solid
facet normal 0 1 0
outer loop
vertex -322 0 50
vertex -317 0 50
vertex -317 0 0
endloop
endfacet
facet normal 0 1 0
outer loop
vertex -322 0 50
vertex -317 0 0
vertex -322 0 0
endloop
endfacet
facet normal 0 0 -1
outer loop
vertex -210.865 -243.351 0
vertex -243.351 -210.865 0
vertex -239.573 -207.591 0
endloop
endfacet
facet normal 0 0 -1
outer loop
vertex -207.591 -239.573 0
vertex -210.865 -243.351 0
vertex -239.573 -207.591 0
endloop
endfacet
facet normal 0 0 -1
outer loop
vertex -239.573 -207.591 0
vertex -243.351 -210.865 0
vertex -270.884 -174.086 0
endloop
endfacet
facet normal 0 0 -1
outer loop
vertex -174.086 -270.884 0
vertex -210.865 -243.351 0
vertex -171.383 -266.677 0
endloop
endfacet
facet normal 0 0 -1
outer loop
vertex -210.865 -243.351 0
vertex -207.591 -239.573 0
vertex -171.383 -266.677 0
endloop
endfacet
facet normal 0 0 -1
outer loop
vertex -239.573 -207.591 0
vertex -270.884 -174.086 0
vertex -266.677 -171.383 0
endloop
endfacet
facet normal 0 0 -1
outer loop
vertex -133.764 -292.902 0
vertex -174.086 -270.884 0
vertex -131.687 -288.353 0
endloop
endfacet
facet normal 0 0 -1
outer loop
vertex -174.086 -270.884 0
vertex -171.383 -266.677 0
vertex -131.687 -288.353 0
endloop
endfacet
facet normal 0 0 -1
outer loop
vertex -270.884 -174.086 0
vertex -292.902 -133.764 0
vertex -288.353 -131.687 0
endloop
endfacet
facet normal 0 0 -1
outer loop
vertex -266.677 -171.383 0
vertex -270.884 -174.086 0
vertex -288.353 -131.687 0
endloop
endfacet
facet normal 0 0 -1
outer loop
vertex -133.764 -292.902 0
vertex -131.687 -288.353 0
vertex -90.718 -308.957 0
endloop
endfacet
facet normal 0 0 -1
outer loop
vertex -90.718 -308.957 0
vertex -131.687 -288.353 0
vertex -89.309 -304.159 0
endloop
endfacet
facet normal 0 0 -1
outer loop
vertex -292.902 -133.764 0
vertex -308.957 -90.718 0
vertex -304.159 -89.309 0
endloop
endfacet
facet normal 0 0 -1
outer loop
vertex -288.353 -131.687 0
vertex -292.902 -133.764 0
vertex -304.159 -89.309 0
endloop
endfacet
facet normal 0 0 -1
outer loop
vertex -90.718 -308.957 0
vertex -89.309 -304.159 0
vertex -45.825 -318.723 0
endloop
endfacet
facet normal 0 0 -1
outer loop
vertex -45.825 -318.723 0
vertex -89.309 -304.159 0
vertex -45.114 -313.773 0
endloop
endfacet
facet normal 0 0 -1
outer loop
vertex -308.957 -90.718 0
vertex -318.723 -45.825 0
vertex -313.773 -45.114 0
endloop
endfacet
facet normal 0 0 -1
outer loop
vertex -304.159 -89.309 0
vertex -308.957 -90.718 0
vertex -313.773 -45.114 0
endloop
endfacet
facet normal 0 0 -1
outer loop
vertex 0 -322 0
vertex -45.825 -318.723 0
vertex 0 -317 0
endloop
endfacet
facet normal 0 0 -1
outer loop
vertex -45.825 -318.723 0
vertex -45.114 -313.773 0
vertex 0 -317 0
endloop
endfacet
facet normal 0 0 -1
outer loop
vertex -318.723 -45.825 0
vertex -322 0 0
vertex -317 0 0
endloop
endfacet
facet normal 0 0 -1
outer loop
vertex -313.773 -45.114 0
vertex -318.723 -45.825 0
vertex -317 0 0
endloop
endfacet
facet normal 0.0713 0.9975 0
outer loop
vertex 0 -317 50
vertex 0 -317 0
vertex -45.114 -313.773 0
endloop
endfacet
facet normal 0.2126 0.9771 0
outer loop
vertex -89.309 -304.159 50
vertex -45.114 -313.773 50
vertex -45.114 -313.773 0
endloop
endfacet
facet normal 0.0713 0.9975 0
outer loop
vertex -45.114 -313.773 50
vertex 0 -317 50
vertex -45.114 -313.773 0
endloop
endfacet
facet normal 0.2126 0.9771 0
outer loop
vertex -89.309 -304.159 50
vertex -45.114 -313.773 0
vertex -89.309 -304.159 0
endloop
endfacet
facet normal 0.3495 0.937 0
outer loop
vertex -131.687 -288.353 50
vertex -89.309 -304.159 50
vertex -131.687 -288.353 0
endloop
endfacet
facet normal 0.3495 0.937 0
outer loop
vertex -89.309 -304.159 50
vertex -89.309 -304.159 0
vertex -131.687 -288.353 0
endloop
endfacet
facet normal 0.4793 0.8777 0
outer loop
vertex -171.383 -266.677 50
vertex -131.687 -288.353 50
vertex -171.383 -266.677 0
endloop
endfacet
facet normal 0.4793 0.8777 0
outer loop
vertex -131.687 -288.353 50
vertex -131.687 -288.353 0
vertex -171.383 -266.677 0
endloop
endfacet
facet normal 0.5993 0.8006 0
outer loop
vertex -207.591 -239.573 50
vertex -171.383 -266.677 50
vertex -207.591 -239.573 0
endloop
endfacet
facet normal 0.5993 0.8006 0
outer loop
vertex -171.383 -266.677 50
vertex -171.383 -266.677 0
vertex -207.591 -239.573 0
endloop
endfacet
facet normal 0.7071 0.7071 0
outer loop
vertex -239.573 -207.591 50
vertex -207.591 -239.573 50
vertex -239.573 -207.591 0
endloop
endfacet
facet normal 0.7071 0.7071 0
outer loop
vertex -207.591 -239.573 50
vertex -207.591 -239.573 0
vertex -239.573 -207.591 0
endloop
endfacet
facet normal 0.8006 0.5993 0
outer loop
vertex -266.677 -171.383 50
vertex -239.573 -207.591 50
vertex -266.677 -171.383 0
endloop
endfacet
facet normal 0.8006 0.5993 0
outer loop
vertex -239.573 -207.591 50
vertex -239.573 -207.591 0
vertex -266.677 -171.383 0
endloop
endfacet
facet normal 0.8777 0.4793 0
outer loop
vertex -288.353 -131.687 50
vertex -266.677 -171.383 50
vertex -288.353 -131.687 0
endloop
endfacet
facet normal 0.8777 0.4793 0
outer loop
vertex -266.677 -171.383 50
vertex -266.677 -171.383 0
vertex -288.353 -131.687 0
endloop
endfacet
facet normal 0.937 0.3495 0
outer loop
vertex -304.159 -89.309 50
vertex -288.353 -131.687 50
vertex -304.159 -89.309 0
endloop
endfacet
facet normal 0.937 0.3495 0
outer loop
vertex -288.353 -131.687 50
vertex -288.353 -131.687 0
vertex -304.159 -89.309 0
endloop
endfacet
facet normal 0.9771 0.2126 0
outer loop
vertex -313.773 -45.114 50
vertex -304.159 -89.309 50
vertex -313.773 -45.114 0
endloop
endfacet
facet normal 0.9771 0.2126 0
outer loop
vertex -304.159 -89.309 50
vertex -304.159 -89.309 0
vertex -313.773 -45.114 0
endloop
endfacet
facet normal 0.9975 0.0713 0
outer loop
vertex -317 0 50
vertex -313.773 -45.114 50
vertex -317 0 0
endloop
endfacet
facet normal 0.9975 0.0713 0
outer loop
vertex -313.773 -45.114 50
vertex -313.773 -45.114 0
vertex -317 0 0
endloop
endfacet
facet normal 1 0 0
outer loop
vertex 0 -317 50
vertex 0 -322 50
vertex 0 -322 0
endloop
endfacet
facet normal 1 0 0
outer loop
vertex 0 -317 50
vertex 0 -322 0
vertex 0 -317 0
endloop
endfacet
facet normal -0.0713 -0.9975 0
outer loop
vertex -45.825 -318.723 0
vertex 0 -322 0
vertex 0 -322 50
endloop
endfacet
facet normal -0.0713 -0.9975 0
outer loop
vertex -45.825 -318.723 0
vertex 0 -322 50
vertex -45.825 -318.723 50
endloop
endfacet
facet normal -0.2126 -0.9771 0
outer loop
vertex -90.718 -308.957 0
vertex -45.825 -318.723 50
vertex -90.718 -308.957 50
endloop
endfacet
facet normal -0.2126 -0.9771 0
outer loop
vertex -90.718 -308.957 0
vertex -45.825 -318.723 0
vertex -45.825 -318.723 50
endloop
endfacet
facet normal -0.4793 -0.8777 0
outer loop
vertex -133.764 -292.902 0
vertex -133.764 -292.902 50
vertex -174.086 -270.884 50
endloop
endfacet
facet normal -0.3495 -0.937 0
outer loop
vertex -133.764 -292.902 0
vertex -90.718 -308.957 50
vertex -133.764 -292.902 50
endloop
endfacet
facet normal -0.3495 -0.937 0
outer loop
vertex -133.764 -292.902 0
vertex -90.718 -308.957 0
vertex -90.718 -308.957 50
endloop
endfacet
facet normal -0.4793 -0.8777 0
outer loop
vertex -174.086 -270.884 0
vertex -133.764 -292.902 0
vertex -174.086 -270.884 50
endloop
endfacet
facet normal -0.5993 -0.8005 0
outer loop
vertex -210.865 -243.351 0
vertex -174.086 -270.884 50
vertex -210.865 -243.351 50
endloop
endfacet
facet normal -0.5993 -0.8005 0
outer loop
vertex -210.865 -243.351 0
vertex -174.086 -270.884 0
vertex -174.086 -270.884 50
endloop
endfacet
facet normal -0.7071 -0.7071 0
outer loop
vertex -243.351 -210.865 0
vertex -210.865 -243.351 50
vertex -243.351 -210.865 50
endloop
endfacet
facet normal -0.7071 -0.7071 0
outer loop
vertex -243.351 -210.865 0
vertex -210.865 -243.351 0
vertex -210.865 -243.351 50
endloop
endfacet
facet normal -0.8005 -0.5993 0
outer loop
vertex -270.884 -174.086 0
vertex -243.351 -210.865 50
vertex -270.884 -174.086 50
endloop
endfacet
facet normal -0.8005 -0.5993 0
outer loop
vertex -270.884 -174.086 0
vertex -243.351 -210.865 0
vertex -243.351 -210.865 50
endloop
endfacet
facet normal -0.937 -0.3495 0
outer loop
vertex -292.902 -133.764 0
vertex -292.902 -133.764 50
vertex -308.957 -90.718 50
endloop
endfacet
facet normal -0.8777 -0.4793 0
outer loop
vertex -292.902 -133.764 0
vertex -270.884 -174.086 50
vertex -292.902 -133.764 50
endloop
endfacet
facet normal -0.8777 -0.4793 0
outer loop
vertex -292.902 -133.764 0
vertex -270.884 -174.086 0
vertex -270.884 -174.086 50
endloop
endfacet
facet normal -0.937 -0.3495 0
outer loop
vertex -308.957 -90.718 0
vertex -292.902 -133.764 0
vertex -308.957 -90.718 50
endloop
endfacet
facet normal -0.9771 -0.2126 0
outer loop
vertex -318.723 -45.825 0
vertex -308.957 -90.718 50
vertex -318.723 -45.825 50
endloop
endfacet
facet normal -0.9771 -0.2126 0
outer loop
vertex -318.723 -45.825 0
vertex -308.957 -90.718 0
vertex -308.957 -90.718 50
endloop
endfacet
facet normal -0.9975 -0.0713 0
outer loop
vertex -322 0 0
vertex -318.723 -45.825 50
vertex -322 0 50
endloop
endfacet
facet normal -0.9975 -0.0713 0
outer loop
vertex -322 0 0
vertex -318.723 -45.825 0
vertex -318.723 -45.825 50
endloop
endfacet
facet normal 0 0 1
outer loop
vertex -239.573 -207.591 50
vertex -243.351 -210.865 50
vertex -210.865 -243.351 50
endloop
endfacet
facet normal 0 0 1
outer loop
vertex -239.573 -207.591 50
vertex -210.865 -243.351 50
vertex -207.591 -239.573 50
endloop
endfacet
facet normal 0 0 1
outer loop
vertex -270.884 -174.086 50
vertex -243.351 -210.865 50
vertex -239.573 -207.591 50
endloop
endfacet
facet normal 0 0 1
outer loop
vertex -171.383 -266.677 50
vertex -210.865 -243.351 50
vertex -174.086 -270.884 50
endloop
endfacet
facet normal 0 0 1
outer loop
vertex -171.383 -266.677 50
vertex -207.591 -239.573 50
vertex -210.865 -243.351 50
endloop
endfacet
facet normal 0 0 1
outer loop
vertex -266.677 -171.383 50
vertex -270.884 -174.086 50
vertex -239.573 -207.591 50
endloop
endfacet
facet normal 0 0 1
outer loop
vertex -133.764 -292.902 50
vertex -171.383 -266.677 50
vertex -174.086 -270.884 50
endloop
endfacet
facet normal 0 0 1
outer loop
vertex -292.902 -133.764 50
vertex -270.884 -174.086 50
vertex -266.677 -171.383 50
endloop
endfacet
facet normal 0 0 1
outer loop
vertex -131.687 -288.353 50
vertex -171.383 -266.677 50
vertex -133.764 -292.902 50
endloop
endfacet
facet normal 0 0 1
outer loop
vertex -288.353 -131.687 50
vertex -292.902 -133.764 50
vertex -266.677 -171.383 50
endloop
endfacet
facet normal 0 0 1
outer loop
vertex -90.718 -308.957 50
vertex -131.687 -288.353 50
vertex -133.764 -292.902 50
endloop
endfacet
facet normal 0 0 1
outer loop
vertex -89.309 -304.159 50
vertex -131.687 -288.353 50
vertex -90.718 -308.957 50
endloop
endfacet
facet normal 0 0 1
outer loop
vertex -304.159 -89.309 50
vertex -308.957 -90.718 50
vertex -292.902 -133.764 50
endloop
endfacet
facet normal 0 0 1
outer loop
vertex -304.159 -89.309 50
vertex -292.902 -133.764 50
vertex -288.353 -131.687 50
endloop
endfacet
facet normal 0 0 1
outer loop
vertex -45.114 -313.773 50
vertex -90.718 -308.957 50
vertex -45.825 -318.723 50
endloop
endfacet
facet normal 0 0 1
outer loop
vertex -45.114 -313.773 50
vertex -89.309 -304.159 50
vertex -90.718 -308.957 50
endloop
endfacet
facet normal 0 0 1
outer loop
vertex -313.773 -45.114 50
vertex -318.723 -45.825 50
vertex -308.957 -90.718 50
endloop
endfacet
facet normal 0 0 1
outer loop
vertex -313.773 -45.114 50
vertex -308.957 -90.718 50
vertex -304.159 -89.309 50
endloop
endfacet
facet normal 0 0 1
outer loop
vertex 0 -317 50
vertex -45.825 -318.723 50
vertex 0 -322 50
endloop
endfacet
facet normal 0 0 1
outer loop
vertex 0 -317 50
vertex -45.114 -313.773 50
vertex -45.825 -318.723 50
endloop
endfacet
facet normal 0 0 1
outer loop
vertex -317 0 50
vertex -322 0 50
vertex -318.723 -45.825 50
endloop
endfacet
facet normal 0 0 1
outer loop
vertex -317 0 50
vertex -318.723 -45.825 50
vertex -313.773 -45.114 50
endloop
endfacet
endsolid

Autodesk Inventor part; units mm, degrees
ref_plane "YZ Plane" through (0, 0, 0) normal (1, 0, 0) x (0, 1, 0)
ref_plane "XZ Plane" through (0, 0, 0) normal (0, 1, 0) x (-1, 0, 0)
ref_plane "XY Plane" through (0, 0, 0) normal (0, 0, 1) x (1, 0, 0)
sketch "草圖1" plane through (0, 0, 0) normal (0, 0, 1) x (1, 0, 0)
  circle A0 centre (0, 0) radius 317
  circle A1 centre (0, 0) radius 322
  dimension "d0" = 634
  dimension "d1" = 644
extrude "擠出1" add sketch "草圖1" along normal blind 50
sketch "草圖2" plane through (0, 0, 50) normal (0, 0, 1) x (1, 0, 0)
  line L0 (-488.5314, 349.6941) -> (538.4038, 349.6941)
  line L1 (538.4038, 349.6941) -> (538.4038, 0)
  line L2 (538.4038, 0) -> (-488.5314, 0)
  line L3 (-488.5314, 0) -> (-488.5314, 349.6941)
  point P0 (0, 0)
  dimension "d4" = 0
extrude "擠出2" cut sketch "草圖2" against normal blind 50
sketch "草圖3" plane through (0, 0, 50) normal (0, 0, 1) x (1, 0, 0)
  line L0 (0, 139.236) -> (398.1663, 139.236)
  line L1 (398.1663, 139.236) -> (398.1663, -465.1236)
  line L2 (398.1663, -465.1236) -> (0, -465.1236)
  line L3 (0, -465.1236) -> (0, 139.236)
  point P0 (0, 0)
  dimension "d7" = 0
extrude "擠出3" cut sketch "草圖3" against normal blind 50
properties part number "鋁底板-半圓"
